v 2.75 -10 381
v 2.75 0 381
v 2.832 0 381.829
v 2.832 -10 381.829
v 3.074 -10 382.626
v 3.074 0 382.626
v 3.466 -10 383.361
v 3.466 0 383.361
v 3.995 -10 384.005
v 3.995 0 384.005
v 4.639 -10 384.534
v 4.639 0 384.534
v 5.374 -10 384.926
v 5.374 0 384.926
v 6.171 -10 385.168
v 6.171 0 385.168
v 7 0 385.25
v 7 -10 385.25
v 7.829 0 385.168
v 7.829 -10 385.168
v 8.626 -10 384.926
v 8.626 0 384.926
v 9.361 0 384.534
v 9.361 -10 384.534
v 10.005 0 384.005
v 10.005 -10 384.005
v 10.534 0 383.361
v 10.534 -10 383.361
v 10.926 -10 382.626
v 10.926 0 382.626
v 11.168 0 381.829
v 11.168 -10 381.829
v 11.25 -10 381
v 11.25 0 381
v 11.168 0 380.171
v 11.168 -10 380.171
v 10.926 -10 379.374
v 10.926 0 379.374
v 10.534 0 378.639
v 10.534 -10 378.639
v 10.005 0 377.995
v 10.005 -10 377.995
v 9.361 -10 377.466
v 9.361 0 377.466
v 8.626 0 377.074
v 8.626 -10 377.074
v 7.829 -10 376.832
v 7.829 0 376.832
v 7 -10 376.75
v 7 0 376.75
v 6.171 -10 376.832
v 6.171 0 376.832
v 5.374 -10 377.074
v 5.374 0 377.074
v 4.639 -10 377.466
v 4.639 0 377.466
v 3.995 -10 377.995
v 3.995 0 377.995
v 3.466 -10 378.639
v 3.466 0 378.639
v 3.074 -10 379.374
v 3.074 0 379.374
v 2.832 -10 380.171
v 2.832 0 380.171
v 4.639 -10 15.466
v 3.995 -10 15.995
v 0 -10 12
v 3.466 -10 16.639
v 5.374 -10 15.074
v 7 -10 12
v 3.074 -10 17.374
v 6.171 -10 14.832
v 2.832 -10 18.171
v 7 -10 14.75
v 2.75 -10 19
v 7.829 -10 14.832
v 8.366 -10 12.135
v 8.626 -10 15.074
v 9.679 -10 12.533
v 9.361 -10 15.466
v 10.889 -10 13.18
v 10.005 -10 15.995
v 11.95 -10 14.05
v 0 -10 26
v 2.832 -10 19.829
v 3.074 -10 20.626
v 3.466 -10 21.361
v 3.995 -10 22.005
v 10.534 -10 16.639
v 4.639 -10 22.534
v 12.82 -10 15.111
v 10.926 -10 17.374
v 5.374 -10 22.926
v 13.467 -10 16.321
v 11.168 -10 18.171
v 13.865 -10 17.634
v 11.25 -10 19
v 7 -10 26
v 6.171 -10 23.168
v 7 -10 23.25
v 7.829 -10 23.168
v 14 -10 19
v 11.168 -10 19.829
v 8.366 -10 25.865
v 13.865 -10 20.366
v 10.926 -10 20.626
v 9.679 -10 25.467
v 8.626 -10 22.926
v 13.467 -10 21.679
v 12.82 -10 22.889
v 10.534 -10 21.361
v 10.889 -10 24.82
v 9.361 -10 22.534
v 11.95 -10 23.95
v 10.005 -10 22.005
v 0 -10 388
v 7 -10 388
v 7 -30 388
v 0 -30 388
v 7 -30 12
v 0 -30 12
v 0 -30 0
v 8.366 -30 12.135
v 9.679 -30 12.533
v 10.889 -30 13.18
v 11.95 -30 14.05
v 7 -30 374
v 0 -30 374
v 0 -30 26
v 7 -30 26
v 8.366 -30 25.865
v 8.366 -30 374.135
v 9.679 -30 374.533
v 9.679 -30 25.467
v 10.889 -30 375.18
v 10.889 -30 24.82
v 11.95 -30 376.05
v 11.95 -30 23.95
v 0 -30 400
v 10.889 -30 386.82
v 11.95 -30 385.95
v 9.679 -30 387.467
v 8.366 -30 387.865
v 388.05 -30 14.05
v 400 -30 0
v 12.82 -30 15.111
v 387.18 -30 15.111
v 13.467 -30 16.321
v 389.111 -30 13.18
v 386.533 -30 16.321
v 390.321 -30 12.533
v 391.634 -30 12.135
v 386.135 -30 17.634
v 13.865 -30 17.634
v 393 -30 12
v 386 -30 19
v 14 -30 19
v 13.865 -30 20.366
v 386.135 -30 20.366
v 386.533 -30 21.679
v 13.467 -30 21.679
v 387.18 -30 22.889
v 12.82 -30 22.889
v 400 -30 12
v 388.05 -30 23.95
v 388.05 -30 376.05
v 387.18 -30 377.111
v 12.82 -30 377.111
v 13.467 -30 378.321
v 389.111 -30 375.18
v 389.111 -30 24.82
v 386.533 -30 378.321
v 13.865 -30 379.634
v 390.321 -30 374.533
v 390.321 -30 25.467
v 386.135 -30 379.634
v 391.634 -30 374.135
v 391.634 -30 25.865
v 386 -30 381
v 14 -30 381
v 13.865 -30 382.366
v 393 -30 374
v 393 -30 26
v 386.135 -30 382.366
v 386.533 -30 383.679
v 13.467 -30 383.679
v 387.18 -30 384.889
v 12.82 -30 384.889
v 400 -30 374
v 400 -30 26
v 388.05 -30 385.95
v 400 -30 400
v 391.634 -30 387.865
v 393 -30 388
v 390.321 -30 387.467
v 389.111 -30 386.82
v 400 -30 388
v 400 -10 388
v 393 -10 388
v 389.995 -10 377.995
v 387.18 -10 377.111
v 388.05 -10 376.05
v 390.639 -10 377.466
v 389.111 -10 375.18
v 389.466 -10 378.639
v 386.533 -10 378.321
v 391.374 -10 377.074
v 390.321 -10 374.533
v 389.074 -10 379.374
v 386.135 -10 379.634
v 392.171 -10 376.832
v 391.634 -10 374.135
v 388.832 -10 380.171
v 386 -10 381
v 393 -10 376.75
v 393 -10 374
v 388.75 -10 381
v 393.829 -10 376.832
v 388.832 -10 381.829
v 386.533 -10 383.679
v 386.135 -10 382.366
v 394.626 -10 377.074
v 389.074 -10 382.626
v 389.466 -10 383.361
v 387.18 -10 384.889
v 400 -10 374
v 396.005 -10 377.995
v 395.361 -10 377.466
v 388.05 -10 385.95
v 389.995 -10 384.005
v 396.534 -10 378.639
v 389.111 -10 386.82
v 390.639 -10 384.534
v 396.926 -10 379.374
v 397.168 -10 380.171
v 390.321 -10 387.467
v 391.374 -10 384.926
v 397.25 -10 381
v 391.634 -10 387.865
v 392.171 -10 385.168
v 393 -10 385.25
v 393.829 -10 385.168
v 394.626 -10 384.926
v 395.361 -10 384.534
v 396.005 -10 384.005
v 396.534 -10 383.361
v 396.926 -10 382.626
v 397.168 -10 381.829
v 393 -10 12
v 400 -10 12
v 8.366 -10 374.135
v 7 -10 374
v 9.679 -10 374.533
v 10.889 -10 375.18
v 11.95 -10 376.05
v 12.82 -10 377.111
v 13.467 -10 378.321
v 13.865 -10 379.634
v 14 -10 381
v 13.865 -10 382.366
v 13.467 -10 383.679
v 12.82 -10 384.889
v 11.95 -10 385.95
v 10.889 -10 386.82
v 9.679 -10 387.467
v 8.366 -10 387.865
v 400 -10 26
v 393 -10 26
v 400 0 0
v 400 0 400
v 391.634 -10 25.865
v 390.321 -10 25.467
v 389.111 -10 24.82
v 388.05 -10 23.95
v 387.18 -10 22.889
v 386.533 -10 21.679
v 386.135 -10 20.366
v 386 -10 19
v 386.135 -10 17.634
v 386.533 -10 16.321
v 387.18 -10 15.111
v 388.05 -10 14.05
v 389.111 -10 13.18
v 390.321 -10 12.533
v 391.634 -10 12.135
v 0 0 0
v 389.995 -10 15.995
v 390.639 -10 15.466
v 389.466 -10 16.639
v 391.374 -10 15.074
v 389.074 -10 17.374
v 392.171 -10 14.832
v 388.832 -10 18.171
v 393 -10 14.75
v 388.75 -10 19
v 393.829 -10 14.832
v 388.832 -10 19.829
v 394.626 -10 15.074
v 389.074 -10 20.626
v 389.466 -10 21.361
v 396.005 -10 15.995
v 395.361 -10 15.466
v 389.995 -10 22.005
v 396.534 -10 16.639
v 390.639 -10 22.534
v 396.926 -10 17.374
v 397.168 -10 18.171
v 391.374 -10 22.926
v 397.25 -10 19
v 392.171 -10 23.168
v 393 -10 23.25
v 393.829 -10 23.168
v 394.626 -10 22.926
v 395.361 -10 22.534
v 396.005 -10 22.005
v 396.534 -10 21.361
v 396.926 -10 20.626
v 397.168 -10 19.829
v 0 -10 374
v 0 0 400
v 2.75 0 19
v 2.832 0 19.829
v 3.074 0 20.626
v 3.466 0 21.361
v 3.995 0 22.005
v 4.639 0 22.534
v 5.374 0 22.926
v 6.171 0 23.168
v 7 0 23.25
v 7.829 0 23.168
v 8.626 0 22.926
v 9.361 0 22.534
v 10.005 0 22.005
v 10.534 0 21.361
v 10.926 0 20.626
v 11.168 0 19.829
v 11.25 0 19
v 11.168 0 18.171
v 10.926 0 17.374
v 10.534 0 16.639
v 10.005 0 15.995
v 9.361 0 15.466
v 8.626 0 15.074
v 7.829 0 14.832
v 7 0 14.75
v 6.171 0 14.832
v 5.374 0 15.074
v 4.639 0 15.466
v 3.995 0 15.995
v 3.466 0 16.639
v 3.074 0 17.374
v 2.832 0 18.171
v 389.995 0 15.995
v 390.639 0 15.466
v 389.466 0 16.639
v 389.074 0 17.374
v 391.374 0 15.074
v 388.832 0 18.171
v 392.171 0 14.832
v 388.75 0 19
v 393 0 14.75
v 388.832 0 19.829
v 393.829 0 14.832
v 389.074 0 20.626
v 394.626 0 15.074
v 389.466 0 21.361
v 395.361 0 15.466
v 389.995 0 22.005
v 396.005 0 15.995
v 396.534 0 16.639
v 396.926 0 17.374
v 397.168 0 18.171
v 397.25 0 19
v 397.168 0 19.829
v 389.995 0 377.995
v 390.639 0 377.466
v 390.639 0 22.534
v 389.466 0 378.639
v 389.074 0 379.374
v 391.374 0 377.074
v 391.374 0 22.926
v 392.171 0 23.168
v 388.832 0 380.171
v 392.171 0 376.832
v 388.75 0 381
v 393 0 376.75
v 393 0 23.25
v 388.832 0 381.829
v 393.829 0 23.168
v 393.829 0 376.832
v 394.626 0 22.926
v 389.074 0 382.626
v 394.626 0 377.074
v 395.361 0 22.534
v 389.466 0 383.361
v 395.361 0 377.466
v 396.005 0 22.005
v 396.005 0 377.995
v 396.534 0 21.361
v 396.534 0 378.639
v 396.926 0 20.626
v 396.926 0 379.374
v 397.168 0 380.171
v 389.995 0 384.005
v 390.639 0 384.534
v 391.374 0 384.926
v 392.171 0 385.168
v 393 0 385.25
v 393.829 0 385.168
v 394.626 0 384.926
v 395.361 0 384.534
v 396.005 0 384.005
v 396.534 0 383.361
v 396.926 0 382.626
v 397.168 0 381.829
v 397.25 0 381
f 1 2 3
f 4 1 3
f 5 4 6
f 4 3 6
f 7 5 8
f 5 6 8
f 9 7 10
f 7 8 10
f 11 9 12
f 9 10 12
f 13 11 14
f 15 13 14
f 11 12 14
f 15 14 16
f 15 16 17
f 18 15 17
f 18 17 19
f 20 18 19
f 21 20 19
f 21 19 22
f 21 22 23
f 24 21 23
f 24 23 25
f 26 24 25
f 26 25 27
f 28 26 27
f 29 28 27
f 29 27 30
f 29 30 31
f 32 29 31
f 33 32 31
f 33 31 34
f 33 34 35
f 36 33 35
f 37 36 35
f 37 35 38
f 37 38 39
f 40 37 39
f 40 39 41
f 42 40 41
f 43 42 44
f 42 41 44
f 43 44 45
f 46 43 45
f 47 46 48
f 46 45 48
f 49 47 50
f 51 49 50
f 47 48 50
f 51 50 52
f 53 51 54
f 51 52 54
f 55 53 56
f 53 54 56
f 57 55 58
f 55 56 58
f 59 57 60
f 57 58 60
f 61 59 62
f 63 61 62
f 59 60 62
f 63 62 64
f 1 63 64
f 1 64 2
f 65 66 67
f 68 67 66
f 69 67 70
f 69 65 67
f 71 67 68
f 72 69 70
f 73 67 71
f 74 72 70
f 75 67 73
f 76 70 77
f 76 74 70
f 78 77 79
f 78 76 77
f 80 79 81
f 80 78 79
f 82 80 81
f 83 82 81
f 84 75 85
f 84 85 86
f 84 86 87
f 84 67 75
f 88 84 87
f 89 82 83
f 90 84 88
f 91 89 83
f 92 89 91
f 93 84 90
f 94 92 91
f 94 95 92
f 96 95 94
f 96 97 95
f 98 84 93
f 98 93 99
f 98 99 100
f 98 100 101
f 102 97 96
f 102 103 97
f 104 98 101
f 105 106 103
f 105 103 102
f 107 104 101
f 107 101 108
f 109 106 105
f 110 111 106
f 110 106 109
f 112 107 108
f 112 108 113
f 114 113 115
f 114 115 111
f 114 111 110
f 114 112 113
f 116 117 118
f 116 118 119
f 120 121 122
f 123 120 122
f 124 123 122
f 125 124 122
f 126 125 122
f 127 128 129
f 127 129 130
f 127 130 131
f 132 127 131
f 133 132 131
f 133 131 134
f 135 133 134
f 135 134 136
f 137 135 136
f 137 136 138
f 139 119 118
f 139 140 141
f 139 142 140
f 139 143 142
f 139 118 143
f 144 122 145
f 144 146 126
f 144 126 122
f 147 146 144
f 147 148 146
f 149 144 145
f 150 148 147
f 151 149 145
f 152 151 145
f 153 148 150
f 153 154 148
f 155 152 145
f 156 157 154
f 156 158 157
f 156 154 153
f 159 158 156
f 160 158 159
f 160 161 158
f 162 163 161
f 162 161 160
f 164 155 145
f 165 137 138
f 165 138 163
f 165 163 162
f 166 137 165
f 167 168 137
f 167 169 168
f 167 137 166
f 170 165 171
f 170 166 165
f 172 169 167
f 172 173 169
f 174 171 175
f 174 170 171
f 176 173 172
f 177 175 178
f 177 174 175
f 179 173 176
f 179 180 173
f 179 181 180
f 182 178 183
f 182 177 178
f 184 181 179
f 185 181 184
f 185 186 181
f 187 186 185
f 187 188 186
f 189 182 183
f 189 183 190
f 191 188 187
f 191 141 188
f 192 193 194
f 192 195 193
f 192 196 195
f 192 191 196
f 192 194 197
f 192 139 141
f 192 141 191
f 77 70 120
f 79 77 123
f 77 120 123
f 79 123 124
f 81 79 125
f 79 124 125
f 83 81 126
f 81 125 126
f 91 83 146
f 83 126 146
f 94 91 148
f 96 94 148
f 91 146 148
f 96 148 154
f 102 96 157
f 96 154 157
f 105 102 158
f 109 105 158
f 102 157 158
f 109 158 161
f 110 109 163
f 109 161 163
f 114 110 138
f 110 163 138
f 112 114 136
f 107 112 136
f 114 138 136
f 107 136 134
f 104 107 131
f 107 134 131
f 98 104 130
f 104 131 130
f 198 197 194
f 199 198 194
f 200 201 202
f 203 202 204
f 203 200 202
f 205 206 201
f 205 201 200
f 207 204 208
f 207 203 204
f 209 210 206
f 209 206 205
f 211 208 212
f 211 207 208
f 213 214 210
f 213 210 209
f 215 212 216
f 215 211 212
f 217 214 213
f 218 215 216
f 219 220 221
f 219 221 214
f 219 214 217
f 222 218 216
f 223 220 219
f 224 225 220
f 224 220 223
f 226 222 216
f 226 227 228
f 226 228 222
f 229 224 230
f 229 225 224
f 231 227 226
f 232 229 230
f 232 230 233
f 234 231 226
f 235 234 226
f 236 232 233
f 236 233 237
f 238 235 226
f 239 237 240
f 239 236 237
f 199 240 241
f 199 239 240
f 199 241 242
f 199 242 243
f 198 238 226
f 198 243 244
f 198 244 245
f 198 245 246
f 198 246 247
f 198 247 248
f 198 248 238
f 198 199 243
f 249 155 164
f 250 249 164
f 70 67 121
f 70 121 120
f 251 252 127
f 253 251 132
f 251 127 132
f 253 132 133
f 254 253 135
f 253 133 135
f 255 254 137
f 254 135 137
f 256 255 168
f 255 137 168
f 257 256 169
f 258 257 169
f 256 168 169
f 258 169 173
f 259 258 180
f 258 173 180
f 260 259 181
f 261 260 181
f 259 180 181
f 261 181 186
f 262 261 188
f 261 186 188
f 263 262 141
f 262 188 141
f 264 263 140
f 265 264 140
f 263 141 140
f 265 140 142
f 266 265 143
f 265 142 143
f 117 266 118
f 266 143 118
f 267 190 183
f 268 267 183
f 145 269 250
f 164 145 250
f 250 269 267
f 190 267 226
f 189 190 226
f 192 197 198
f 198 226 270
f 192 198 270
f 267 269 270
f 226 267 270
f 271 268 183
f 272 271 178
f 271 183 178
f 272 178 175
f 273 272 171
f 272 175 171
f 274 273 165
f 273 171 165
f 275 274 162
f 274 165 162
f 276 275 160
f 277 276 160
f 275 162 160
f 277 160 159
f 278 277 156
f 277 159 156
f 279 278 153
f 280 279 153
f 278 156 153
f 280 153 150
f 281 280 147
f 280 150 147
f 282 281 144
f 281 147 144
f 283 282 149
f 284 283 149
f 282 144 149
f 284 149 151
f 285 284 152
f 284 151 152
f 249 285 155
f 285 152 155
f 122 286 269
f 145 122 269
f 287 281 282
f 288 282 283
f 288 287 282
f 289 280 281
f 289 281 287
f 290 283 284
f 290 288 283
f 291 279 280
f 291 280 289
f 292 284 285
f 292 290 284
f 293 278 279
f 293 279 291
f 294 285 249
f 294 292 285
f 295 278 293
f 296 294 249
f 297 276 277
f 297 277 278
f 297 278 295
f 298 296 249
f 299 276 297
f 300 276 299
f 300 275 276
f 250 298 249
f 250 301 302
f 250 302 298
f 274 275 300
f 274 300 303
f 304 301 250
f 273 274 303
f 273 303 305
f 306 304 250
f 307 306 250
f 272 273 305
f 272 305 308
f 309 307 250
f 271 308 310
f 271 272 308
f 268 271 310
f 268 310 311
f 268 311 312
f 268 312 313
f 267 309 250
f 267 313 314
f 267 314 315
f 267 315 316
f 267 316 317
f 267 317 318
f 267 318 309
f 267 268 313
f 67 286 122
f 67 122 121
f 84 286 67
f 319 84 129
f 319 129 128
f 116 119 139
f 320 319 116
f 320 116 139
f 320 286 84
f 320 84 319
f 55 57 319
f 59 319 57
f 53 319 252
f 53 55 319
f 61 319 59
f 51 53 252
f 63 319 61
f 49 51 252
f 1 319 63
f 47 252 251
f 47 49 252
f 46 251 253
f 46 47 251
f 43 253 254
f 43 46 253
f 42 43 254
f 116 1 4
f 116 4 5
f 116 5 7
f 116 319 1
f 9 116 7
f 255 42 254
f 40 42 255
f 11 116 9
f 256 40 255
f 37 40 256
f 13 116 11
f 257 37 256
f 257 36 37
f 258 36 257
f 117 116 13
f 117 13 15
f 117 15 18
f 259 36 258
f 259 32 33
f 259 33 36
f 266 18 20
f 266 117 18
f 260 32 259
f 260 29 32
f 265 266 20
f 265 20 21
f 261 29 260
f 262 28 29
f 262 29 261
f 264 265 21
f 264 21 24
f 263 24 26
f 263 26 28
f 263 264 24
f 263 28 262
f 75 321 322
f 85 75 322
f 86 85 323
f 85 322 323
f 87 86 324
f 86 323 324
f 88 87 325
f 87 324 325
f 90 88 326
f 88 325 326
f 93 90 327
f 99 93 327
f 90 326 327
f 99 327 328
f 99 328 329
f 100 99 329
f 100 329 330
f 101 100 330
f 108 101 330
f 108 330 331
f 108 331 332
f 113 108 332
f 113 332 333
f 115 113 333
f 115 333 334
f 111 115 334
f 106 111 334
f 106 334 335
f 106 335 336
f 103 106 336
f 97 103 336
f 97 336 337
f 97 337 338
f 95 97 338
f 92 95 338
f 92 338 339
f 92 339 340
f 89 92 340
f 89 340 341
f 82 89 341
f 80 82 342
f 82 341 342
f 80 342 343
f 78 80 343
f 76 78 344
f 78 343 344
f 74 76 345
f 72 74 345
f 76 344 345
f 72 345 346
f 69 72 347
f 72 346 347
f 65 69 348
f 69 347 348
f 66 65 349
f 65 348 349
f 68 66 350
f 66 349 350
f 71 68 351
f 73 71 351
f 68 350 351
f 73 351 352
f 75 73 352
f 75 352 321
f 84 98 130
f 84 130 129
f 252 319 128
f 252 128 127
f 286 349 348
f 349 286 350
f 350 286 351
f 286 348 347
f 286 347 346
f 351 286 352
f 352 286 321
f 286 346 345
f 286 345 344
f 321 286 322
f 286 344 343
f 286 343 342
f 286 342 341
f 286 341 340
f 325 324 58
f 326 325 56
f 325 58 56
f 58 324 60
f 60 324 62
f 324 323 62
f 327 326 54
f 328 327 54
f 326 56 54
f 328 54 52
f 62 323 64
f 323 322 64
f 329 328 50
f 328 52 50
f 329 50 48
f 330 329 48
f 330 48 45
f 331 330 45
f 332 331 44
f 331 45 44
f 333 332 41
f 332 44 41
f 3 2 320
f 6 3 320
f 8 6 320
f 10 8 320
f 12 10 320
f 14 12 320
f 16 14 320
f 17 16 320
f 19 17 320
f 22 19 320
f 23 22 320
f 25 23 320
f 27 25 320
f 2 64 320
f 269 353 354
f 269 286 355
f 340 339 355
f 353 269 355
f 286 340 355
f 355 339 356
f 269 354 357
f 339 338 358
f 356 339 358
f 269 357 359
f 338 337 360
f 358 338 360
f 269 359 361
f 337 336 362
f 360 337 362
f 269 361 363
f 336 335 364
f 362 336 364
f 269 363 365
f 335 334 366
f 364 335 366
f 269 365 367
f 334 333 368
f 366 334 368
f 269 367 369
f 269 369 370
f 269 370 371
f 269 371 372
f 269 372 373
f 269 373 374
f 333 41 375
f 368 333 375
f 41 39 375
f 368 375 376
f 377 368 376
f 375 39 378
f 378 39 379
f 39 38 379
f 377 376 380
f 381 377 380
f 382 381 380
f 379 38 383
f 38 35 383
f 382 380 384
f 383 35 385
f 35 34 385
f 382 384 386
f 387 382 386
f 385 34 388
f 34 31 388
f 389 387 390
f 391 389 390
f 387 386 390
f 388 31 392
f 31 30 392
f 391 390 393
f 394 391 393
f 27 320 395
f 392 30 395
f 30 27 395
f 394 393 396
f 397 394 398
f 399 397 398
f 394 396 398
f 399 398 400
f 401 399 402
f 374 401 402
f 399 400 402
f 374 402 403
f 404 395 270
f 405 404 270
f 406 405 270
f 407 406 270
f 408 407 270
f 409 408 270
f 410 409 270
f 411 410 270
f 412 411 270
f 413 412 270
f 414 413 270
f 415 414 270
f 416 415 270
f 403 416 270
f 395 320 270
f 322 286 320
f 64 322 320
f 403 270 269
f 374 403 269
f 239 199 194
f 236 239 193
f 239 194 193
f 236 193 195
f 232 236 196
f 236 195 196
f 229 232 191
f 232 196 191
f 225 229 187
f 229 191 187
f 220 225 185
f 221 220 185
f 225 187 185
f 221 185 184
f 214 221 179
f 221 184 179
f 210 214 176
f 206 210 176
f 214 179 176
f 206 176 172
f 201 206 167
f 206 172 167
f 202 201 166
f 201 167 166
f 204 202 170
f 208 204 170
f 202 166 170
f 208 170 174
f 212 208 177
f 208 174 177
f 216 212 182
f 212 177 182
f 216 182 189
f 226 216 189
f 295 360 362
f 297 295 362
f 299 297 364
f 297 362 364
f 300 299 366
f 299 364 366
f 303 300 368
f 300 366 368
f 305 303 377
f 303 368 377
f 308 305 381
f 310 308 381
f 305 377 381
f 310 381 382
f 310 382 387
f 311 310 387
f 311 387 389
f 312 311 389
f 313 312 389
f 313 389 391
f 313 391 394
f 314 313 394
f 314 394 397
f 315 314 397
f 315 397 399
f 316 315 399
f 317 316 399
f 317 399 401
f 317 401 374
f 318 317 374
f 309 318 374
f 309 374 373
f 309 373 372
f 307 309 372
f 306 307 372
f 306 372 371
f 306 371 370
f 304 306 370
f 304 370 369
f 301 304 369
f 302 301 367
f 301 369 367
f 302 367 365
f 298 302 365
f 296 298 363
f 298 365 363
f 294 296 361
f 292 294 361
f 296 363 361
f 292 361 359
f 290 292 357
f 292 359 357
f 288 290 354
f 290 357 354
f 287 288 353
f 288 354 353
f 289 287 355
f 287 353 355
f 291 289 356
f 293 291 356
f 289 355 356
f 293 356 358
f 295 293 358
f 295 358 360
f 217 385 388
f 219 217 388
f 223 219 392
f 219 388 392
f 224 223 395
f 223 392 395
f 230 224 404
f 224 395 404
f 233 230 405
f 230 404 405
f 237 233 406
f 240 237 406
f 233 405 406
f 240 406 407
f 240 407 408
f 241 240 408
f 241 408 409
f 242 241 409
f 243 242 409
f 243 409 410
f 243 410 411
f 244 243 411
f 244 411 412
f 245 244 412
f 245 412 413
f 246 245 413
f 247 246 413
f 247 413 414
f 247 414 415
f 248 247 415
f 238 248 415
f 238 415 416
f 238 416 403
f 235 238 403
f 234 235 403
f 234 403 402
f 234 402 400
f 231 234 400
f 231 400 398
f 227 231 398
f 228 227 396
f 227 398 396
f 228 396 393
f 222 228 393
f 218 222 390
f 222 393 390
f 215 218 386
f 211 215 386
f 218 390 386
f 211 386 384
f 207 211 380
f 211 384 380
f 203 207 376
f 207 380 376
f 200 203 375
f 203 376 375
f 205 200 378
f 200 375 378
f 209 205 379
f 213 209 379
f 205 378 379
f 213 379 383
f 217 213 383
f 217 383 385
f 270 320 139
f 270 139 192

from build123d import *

# Parameters (mm, degrees)
F0_W     = 400
F0_H     = 400
F1_DEPTH = 30
F3_DEPTH = 20
F5_D     = 8.5


with BuildPart() as f1:
    # F0 (on Front) → F1 (new body)
    with BuildSketch(Plane.XZ):
        with Locations((200, 200)):
            Rectangle(F0_W, F0_H)
    extrude(amount=F1_DEPTH)

    # F2 (on face) → F3 (cut)
    with BuildSketch(Plane.XZ.offset(30)):
        with BuildLine():
            Line((7, 26), (0, 26))
            Line((0, 26), (0, 12))
            Line((0, 12), (7, 12))
            ThreePointArc((7, 12), (14, 19), (7, 26))
        make_face()
        with BuildLine():
            Line((393, 12), (400, 12))
            Line((400, 12), (400, 26))
            Line((400, 26), (393, 26))
            ThreePointArc((393, 26), (386, 19), (393, 12))
        make_face()
        with BuildLine():
            Line((400, 374), (400, 388))
            Line((400, 388), (393, 388))
            ThreePointArc((393, 388), (386, 381), (393, 374))
            Line((393, 374), (400, 374))
        make_face()
        with BuildLine():
            Line((0, 381), (0, 374))
            Line((0, 374), (7, 374))
            ThreePointArc((7, 374), (14, 381), (7, 388))
            Line((7, 388), (0, 388))
            Line((0, 388), (0, 381))
        make_face()
    extrude(amount=-F3_DEPTH, mode=Mode.SUBTRACT)

    # F5 (through all)
    with Locations(Plane.XZ.offset(10)):
        with Locations((7, 381), (393, 381), (393, 19), (7, 19)):
            Hole(F5_D / 2)


solid = f1.part
